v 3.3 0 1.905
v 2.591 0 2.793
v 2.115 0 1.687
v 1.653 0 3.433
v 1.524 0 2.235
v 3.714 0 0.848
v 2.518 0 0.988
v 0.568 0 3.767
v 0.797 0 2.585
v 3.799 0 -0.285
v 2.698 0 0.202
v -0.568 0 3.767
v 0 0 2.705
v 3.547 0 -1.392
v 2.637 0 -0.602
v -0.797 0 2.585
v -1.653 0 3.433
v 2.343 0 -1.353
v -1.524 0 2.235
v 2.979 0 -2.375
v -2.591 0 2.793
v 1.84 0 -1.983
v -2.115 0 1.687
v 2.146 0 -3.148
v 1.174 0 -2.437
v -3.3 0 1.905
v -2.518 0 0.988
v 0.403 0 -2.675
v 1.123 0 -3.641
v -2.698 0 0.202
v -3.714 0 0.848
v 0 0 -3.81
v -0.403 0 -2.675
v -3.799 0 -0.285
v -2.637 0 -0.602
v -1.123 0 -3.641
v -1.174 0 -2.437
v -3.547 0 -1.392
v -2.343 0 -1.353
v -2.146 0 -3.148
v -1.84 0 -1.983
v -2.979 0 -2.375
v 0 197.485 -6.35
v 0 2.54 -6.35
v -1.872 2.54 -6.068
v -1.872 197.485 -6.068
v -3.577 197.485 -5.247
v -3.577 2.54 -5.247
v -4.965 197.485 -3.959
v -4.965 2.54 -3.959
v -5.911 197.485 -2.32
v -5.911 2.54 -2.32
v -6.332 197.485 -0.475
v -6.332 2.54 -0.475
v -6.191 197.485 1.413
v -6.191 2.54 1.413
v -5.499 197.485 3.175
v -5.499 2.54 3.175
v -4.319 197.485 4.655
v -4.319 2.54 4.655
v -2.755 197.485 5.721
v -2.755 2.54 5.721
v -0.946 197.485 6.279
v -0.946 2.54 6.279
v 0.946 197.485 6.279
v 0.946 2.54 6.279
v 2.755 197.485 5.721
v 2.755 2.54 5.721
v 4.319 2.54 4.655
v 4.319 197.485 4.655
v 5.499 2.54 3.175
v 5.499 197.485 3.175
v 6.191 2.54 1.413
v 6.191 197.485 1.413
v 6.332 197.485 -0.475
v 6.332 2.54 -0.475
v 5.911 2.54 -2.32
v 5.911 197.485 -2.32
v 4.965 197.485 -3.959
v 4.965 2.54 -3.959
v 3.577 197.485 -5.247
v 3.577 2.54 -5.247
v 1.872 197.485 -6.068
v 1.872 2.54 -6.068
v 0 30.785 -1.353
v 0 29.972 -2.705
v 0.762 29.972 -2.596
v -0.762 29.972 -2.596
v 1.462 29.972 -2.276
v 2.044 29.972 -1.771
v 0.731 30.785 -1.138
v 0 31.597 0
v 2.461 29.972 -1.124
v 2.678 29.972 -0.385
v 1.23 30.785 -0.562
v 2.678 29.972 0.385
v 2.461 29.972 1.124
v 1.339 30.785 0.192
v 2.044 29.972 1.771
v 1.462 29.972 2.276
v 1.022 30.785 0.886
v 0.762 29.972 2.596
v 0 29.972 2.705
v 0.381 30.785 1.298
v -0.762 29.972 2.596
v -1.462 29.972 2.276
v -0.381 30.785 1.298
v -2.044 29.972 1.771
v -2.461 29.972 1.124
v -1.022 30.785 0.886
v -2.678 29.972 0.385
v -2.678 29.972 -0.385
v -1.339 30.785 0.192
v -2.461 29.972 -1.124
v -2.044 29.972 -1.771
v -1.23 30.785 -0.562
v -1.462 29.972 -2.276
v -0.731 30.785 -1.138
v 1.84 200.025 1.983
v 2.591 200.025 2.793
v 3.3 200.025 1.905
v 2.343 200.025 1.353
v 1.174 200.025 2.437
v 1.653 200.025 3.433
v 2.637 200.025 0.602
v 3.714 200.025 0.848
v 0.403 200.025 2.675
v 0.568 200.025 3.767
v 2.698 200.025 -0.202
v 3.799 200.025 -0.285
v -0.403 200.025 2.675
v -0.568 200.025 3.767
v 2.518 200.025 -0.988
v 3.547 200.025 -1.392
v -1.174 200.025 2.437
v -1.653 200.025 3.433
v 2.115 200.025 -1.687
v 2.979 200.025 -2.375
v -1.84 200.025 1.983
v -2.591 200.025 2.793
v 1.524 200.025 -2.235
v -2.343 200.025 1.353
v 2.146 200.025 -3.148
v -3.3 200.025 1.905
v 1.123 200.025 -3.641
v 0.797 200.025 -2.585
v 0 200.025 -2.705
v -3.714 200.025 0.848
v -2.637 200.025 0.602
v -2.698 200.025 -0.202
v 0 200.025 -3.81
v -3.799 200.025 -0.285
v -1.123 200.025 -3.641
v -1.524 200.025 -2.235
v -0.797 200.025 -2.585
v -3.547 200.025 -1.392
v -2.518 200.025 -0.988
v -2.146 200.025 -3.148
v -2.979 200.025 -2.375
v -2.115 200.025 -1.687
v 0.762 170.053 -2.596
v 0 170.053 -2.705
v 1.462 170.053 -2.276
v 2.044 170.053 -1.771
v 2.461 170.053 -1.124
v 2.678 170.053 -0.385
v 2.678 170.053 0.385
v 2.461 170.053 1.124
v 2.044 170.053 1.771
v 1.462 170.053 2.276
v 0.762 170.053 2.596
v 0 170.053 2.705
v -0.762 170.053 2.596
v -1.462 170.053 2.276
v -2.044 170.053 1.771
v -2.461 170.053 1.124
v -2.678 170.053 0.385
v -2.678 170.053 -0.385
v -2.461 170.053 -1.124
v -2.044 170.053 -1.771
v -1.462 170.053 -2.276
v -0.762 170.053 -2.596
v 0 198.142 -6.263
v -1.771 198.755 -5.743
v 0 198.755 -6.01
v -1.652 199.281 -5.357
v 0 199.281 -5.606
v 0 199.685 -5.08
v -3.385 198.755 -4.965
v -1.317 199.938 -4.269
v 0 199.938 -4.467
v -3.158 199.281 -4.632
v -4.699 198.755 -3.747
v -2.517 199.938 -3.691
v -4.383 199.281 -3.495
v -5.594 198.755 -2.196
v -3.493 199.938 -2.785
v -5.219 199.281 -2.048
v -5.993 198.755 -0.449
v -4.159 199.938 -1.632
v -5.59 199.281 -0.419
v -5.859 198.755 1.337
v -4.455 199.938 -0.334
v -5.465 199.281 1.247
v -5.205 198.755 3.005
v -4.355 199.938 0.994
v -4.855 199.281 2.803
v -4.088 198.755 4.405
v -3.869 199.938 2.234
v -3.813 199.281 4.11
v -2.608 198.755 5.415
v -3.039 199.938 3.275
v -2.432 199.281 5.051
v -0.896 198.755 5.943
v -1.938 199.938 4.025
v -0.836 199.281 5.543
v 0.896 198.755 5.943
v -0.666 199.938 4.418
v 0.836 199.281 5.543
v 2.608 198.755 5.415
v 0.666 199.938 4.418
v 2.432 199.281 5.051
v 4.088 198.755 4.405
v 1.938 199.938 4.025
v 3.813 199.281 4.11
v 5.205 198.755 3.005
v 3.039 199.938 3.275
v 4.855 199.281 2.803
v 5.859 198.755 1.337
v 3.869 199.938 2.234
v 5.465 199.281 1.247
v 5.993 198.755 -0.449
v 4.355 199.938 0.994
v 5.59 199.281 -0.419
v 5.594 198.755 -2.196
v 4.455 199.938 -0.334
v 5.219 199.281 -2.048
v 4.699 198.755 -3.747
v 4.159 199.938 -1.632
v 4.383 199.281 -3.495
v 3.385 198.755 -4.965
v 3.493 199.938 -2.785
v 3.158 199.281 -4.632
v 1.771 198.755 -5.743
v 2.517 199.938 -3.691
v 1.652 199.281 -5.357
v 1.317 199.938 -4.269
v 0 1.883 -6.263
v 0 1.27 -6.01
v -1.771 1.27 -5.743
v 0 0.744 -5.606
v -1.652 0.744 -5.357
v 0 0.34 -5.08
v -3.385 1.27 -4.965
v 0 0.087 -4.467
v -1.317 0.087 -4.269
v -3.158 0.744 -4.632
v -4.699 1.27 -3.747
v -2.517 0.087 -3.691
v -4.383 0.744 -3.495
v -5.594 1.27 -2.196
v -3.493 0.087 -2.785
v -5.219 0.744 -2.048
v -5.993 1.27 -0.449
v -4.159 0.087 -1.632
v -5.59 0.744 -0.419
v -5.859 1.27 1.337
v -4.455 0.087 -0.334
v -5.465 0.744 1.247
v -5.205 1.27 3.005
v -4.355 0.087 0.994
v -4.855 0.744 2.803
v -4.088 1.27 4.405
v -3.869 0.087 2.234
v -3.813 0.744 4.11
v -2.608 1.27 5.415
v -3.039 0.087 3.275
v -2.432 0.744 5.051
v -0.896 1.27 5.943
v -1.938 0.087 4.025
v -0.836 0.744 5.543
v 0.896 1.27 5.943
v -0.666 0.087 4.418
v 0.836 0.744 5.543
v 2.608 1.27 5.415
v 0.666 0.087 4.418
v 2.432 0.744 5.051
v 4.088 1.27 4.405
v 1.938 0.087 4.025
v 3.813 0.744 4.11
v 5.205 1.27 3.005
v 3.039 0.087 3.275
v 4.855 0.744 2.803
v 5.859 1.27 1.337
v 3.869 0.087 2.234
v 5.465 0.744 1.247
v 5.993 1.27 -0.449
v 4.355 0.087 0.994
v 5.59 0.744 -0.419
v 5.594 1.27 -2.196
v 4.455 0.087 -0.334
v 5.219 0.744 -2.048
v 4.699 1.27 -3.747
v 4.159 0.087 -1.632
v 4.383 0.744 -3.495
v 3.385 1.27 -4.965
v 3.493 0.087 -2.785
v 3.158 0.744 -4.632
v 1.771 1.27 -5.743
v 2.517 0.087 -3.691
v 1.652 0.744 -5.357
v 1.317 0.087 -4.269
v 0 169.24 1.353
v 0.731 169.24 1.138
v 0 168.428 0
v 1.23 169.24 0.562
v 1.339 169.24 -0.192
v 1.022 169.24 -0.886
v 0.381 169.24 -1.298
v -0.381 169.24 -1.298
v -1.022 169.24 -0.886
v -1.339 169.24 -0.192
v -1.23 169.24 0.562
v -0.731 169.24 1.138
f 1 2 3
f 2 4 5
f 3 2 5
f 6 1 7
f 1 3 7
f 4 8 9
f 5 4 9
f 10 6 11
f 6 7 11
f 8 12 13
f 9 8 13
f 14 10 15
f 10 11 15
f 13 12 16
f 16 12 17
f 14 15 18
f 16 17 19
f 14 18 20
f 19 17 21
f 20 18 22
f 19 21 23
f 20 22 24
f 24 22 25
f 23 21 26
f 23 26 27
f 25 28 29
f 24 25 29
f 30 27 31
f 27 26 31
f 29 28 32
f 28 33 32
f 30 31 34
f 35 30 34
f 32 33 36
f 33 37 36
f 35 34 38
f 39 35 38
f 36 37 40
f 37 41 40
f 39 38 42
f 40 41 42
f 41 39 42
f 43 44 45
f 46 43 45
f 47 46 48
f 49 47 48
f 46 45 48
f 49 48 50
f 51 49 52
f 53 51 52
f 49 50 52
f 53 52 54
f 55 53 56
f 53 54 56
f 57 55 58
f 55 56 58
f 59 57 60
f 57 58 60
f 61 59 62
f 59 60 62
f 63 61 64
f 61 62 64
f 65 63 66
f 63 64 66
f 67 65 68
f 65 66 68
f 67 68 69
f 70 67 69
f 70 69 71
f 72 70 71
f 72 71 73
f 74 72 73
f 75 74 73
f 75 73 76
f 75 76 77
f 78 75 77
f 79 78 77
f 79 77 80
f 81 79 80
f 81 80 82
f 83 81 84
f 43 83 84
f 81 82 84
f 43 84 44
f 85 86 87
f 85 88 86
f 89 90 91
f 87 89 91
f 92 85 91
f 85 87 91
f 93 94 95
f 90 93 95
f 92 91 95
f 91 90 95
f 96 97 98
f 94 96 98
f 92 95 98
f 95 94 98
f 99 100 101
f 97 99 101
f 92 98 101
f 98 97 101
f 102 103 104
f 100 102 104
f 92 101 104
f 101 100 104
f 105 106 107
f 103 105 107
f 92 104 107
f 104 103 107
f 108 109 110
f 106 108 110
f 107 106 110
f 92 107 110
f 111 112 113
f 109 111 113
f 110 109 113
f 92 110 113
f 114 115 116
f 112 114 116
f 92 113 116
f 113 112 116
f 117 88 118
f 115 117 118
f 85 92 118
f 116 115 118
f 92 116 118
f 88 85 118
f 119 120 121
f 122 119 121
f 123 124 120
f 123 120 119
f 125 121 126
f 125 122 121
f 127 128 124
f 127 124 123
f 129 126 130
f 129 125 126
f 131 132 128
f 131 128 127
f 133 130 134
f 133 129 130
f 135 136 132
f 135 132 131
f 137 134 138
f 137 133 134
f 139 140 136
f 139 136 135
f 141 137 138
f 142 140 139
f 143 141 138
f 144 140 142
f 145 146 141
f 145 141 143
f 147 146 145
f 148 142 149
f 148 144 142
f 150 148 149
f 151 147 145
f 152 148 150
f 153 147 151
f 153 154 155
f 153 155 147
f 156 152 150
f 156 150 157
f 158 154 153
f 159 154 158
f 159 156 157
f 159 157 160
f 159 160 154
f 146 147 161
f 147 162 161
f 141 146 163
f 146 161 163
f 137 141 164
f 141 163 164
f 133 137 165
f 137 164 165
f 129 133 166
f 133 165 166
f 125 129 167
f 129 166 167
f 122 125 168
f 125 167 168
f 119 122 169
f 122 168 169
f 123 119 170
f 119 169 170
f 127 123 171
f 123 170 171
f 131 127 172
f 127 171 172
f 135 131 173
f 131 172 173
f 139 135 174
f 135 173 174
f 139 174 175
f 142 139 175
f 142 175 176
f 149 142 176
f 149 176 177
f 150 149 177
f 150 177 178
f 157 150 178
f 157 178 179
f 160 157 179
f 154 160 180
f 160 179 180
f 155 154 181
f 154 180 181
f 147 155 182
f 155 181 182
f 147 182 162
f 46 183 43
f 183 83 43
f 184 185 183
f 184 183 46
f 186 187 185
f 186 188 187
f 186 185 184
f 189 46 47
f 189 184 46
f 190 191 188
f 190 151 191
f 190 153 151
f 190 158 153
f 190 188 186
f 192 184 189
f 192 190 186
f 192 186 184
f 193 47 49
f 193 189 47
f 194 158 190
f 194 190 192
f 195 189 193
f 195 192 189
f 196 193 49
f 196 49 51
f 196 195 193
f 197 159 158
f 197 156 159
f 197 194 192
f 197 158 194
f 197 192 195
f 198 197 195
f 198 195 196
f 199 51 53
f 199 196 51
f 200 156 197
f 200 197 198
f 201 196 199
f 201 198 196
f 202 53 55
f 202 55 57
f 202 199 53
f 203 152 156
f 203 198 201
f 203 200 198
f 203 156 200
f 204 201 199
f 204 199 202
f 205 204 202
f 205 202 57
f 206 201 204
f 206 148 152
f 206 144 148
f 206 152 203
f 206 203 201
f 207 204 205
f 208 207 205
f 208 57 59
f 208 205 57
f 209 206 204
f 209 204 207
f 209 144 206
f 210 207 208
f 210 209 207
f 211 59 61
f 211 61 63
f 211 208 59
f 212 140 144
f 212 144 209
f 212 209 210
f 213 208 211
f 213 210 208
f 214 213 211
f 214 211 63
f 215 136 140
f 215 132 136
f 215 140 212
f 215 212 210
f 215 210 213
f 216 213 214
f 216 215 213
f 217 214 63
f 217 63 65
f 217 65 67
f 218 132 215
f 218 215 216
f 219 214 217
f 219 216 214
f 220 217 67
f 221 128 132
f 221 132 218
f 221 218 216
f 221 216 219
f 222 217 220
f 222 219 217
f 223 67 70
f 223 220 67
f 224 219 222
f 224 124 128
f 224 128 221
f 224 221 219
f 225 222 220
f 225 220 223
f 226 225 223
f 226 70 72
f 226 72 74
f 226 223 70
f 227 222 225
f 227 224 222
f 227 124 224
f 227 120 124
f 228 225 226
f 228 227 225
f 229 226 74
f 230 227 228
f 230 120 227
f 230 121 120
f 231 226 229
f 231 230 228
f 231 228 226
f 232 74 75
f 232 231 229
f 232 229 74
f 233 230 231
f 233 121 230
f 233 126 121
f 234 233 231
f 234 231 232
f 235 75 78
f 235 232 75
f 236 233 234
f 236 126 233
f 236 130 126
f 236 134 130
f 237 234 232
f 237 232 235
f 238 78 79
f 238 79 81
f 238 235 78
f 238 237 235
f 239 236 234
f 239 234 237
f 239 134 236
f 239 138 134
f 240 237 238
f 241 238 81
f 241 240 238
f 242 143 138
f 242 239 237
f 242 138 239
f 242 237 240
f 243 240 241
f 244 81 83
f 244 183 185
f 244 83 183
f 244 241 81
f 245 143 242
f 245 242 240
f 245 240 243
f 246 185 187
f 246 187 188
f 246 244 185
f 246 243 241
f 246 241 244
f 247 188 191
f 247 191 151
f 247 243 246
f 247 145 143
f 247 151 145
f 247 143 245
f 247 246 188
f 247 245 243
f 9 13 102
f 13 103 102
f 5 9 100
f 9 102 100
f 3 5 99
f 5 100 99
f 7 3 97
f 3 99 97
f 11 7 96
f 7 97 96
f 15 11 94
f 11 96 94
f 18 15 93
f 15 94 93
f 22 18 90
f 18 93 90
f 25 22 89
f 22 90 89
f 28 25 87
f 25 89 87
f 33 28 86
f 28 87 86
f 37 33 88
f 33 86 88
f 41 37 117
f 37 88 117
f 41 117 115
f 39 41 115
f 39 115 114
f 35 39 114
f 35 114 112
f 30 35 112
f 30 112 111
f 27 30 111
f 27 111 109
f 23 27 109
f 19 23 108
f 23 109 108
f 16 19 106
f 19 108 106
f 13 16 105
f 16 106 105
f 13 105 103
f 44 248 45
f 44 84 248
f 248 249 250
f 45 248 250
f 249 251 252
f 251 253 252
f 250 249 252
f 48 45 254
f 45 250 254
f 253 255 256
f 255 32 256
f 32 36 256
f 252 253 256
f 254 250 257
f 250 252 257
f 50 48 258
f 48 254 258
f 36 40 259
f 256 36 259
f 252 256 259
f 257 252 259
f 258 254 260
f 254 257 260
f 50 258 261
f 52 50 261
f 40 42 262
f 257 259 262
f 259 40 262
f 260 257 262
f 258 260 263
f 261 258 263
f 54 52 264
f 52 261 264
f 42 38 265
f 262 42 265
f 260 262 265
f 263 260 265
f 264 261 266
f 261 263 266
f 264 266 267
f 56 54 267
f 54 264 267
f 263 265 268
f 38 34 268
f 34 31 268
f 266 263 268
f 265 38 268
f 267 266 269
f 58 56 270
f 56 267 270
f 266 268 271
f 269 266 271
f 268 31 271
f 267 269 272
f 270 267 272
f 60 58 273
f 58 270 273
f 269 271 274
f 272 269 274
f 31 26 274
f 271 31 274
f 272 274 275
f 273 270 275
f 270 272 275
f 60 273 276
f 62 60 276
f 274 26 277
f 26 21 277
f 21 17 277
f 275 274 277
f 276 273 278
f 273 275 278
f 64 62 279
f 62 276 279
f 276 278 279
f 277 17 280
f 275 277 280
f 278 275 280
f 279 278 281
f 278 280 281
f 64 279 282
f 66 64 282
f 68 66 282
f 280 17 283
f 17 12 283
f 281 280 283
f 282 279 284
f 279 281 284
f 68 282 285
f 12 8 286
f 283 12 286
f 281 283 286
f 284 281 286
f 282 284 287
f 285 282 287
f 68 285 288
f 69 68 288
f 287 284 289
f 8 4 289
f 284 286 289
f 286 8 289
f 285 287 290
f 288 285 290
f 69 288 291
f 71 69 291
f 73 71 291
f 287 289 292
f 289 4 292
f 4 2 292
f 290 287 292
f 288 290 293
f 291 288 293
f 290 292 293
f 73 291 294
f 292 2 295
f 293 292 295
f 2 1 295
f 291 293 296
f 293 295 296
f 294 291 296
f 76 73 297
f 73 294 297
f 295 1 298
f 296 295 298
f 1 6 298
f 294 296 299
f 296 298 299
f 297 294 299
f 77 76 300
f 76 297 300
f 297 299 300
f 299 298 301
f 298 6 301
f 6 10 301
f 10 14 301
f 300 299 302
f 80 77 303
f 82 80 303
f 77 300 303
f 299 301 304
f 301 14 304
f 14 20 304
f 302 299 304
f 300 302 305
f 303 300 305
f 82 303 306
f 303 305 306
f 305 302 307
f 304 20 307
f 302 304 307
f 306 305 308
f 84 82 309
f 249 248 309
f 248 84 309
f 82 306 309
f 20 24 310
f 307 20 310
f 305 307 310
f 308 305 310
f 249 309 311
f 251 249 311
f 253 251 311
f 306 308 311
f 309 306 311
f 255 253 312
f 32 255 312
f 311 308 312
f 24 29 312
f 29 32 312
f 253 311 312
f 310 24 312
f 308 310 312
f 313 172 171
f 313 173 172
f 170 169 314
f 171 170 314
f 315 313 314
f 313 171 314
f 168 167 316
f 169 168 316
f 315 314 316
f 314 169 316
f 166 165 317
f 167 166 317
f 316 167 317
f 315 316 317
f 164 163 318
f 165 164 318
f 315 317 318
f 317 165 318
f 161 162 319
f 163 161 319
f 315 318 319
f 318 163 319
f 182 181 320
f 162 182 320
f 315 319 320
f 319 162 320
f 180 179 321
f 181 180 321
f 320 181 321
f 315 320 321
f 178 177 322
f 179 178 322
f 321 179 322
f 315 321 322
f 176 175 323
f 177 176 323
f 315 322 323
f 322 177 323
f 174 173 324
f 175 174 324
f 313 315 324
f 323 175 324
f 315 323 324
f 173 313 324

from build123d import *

# Parameters (mm, degrees)
SKETCH1_R                   = 6.35
BOSS_EXTRUDE1_DEPTH         = 200.025
F_1_4_28_TAPPED_HOLE6_D     = 5.4102
F_1_4_28_TAPPED_HOLE6_DEPTH = 29.972
F_1_4_28_TAPPED_HOLE6_TIP   = 1.625388061
F_1_4_28_TAPPED_HOLE8_D     = 5.4102
F_1_4_28_TAPPED_HOLE8_DEPTH = 29.972
F_1_4_28_TAPPED_HOLE8_TIP   = 1.625388061
FILLET4_R                   = 2.54
FILLET5_R                   = 2.54


with BuildPart() as part:
    # Sketch1 → Boss-Extrude1 (new body)
    with BuildSketch(Plane(origin=(0, 0, 0), x_dir=(1, 0, 0), z_dir=(0, 1, 0))):
        with Locations(Location((0, 0, 0), (0, 0, 90))):
            Circle(SKETCH1_R)
    extrude(amount=BOSS_EXTRUDE1_DEPTH)

    # 1/4-28 Tapped Hole6
    with Locations(Plane.ZX.offset(200.025)):
        with Locations((0, 0)):
            Hole(F_1_4_28_TAPPED_HOLE6_D / 2, depth=F_1_4_28_TAPPED_HOLE6_DEPTH)
            with Locations((0, 0, -(F_1_4_28_TAPPED_HOLE6_DEPTH + F_1_4_28_TAPPED_HOLE6_TIP / 2))):  # 118° drill point
                Cone(0, F_1_4_28_TAPPED_HOLE6_D / 2, F_1_4_28_TAPPED_HOLE6_TIP, mode=Mode.SUBTRACT)

    # 1/4-28 Tapped Hole8
    with Locations(Plane(origin=(0, 0, 0), x_dir=(0, 0, -1), z_dir=(0, -1, 0))):
        with Locations((0, 0)):
            Hole(F_1_4_28_TAPPED_HOLE8_D / 2, depth=F_1_4_28_TAPPED_HOLE8_DEPTH)
            with Locations((0, 0, -(F_1_4_28_TAPPED_HOLE8_DEPTH + F_1_4_28_TAPPED_HOLE8_TIP / 2))):  # 118° drill point
                Cone(0, F_1_4_28_TAPPED_HOLE8_D / 2, F_1_4_28_TAPPED_HOLE8_TIP, mode=Mode.SUBTRACT)

    # Fillet4
    fillet4_edges = [part.edges().sort_by_distance(p)[0] for p in [
        (0, 200.025, 6.35),
    ]]
    fillet(fillet4_edges, radius=FILLET4_R)

    # Fillet5
    fillet5_edges = [part.edges().sort_by_distance(p)[0] for p in [
        (0, 0, 6.35),
    ]]
    fillet(fillet5_edges, radius=FILLET5_R)


solid = part.part
